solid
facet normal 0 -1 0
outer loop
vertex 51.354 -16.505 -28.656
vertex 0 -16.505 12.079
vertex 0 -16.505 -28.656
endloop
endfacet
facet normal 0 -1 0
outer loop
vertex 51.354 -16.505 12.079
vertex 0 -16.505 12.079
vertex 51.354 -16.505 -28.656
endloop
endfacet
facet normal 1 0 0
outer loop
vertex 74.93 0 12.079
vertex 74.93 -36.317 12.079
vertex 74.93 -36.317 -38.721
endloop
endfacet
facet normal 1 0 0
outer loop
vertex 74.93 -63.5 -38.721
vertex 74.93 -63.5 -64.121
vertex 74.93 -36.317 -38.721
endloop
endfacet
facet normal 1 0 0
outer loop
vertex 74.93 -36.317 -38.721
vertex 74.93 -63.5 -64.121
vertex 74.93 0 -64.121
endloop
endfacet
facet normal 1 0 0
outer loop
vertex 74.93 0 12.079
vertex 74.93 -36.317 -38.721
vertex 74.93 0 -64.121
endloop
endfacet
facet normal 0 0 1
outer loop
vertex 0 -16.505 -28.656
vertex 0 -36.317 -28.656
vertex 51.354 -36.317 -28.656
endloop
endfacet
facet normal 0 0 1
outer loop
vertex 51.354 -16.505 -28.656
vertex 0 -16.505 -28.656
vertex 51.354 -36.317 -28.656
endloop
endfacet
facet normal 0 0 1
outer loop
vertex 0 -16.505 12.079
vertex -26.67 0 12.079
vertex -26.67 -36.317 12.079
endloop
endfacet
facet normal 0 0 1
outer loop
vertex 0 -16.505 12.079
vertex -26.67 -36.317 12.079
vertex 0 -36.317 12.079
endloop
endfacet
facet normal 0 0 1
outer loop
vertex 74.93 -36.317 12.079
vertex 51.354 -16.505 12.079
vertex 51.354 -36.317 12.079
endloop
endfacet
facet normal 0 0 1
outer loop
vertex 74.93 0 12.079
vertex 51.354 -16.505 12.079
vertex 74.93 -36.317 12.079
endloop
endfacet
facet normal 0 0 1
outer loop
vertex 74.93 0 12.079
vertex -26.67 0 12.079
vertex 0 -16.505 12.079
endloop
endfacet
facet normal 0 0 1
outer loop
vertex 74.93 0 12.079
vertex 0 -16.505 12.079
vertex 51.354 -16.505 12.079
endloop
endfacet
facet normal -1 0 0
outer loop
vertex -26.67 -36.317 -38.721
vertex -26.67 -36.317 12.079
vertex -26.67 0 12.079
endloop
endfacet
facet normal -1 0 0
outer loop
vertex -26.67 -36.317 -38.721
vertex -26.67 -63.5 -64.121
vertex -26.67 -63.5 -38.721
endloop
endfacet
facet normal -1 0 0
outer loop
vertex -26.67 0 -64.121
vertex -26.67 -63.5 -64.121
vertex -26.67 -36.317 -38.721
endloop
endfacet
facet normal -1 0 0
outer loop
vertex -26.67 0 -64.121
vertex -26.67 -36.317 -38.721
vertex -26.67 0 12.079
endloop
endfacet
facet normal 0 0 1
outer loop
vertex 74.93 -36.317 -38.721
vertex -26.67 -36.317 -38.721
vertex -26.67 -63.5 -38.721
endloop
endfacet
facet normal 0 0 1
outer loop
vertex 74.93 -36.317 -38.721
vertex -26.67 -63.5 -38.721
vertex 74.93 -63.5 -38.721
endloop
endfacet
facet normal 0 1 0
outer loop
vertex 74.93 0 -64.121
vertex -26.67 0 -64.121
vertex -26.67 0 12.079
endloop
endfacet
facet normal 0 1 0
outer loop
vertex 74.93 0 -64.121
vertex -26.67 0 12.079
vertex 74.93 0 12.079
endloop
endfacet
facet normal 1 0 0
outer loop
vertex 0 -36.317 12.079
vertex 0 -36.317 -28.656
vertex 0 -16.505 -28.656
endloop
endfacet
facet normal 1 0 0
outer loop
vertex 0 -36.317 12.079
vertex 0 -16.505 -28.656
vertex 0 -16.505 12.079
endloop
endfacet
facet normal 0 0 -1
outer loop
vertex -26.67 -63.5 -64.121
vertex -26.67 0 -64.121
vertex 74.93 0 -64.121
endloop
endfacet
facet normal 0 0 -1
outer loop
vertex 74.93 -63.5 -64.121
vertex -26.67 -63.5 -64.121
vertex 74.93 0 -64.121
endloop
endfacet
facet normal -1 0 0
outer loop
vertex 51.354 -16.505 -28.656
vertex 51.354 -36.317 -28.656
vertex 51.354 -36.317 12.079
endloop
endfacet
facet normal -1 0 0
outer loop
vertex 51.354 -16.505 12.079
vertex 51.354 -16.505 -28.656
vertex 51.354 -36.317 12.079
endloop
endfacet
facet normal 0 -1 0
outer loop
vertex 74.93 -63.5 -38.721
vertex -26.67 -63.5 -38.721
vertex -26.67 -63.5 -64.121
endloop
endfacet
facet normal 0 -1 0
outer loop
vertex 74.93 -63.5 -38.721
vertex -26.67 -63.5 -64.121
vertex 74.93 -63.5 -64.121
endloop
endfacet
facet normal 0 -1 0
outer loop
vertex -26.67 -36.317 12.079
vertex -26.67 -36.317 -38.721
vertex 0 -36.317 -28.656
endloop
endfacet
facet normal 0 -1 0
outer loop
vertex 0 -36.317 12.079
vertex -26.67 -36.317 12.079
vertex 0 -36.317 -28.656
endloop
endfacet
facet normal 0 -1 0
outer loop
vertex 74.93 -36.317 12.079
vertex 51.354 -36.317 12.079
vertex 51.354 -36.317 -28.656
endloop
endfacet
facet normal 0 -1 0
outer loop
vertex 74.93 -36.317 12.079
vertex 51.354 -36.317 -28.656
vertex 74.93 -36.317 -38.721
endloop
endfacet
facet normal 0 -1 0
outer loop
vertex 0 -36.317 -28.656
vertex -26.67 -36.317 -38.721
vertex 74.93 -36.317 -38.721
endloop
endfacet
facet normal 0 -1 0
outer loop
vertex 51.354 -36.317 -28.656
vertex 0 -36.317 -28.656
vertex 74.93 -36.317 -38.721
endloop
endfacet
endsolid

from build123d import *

# Parameters (mm, degrees)
F0_W     = 101.6
F0_H     = 25.4
F1_DEPTH = 63.5
F2_W     = 101.6
F2_H     = 36.316596
F3_DEPTH = 50.8
F4_W     = 51.353935
F4_H     = 40.734572
F5_DEPTH = 19.812


with BuildPart() as f1:
    # F0 (on Front) → F1 (new body)
    with BuildSketch(Plane.XZ):
        with Locations((24.13, -51.421492)):
            Rectangle(F0_W, F0_H)
    extrude(amount=F1_DEPTH)

    # F2 (on face) → F3 (join)
    with BuildSketch(Plane.XY.offset(-38.721492)):
        with Locations((24.13, -18.158298)):
            Rectangle(F2_W, F2_H)
    extrude(amount=F3_DEPTH)

    # F4 (on face) → F5 (cut)
    with BuildSketch(Plane.XZ.offset(36.316596)):
        with Locations((25.676967, -8.288778)):
            Rectangle(F4_W, F4_H)
    extrude(amount=-F5_DEPTH, mode=Mode.SUBTRACT)


solid = f1.part
